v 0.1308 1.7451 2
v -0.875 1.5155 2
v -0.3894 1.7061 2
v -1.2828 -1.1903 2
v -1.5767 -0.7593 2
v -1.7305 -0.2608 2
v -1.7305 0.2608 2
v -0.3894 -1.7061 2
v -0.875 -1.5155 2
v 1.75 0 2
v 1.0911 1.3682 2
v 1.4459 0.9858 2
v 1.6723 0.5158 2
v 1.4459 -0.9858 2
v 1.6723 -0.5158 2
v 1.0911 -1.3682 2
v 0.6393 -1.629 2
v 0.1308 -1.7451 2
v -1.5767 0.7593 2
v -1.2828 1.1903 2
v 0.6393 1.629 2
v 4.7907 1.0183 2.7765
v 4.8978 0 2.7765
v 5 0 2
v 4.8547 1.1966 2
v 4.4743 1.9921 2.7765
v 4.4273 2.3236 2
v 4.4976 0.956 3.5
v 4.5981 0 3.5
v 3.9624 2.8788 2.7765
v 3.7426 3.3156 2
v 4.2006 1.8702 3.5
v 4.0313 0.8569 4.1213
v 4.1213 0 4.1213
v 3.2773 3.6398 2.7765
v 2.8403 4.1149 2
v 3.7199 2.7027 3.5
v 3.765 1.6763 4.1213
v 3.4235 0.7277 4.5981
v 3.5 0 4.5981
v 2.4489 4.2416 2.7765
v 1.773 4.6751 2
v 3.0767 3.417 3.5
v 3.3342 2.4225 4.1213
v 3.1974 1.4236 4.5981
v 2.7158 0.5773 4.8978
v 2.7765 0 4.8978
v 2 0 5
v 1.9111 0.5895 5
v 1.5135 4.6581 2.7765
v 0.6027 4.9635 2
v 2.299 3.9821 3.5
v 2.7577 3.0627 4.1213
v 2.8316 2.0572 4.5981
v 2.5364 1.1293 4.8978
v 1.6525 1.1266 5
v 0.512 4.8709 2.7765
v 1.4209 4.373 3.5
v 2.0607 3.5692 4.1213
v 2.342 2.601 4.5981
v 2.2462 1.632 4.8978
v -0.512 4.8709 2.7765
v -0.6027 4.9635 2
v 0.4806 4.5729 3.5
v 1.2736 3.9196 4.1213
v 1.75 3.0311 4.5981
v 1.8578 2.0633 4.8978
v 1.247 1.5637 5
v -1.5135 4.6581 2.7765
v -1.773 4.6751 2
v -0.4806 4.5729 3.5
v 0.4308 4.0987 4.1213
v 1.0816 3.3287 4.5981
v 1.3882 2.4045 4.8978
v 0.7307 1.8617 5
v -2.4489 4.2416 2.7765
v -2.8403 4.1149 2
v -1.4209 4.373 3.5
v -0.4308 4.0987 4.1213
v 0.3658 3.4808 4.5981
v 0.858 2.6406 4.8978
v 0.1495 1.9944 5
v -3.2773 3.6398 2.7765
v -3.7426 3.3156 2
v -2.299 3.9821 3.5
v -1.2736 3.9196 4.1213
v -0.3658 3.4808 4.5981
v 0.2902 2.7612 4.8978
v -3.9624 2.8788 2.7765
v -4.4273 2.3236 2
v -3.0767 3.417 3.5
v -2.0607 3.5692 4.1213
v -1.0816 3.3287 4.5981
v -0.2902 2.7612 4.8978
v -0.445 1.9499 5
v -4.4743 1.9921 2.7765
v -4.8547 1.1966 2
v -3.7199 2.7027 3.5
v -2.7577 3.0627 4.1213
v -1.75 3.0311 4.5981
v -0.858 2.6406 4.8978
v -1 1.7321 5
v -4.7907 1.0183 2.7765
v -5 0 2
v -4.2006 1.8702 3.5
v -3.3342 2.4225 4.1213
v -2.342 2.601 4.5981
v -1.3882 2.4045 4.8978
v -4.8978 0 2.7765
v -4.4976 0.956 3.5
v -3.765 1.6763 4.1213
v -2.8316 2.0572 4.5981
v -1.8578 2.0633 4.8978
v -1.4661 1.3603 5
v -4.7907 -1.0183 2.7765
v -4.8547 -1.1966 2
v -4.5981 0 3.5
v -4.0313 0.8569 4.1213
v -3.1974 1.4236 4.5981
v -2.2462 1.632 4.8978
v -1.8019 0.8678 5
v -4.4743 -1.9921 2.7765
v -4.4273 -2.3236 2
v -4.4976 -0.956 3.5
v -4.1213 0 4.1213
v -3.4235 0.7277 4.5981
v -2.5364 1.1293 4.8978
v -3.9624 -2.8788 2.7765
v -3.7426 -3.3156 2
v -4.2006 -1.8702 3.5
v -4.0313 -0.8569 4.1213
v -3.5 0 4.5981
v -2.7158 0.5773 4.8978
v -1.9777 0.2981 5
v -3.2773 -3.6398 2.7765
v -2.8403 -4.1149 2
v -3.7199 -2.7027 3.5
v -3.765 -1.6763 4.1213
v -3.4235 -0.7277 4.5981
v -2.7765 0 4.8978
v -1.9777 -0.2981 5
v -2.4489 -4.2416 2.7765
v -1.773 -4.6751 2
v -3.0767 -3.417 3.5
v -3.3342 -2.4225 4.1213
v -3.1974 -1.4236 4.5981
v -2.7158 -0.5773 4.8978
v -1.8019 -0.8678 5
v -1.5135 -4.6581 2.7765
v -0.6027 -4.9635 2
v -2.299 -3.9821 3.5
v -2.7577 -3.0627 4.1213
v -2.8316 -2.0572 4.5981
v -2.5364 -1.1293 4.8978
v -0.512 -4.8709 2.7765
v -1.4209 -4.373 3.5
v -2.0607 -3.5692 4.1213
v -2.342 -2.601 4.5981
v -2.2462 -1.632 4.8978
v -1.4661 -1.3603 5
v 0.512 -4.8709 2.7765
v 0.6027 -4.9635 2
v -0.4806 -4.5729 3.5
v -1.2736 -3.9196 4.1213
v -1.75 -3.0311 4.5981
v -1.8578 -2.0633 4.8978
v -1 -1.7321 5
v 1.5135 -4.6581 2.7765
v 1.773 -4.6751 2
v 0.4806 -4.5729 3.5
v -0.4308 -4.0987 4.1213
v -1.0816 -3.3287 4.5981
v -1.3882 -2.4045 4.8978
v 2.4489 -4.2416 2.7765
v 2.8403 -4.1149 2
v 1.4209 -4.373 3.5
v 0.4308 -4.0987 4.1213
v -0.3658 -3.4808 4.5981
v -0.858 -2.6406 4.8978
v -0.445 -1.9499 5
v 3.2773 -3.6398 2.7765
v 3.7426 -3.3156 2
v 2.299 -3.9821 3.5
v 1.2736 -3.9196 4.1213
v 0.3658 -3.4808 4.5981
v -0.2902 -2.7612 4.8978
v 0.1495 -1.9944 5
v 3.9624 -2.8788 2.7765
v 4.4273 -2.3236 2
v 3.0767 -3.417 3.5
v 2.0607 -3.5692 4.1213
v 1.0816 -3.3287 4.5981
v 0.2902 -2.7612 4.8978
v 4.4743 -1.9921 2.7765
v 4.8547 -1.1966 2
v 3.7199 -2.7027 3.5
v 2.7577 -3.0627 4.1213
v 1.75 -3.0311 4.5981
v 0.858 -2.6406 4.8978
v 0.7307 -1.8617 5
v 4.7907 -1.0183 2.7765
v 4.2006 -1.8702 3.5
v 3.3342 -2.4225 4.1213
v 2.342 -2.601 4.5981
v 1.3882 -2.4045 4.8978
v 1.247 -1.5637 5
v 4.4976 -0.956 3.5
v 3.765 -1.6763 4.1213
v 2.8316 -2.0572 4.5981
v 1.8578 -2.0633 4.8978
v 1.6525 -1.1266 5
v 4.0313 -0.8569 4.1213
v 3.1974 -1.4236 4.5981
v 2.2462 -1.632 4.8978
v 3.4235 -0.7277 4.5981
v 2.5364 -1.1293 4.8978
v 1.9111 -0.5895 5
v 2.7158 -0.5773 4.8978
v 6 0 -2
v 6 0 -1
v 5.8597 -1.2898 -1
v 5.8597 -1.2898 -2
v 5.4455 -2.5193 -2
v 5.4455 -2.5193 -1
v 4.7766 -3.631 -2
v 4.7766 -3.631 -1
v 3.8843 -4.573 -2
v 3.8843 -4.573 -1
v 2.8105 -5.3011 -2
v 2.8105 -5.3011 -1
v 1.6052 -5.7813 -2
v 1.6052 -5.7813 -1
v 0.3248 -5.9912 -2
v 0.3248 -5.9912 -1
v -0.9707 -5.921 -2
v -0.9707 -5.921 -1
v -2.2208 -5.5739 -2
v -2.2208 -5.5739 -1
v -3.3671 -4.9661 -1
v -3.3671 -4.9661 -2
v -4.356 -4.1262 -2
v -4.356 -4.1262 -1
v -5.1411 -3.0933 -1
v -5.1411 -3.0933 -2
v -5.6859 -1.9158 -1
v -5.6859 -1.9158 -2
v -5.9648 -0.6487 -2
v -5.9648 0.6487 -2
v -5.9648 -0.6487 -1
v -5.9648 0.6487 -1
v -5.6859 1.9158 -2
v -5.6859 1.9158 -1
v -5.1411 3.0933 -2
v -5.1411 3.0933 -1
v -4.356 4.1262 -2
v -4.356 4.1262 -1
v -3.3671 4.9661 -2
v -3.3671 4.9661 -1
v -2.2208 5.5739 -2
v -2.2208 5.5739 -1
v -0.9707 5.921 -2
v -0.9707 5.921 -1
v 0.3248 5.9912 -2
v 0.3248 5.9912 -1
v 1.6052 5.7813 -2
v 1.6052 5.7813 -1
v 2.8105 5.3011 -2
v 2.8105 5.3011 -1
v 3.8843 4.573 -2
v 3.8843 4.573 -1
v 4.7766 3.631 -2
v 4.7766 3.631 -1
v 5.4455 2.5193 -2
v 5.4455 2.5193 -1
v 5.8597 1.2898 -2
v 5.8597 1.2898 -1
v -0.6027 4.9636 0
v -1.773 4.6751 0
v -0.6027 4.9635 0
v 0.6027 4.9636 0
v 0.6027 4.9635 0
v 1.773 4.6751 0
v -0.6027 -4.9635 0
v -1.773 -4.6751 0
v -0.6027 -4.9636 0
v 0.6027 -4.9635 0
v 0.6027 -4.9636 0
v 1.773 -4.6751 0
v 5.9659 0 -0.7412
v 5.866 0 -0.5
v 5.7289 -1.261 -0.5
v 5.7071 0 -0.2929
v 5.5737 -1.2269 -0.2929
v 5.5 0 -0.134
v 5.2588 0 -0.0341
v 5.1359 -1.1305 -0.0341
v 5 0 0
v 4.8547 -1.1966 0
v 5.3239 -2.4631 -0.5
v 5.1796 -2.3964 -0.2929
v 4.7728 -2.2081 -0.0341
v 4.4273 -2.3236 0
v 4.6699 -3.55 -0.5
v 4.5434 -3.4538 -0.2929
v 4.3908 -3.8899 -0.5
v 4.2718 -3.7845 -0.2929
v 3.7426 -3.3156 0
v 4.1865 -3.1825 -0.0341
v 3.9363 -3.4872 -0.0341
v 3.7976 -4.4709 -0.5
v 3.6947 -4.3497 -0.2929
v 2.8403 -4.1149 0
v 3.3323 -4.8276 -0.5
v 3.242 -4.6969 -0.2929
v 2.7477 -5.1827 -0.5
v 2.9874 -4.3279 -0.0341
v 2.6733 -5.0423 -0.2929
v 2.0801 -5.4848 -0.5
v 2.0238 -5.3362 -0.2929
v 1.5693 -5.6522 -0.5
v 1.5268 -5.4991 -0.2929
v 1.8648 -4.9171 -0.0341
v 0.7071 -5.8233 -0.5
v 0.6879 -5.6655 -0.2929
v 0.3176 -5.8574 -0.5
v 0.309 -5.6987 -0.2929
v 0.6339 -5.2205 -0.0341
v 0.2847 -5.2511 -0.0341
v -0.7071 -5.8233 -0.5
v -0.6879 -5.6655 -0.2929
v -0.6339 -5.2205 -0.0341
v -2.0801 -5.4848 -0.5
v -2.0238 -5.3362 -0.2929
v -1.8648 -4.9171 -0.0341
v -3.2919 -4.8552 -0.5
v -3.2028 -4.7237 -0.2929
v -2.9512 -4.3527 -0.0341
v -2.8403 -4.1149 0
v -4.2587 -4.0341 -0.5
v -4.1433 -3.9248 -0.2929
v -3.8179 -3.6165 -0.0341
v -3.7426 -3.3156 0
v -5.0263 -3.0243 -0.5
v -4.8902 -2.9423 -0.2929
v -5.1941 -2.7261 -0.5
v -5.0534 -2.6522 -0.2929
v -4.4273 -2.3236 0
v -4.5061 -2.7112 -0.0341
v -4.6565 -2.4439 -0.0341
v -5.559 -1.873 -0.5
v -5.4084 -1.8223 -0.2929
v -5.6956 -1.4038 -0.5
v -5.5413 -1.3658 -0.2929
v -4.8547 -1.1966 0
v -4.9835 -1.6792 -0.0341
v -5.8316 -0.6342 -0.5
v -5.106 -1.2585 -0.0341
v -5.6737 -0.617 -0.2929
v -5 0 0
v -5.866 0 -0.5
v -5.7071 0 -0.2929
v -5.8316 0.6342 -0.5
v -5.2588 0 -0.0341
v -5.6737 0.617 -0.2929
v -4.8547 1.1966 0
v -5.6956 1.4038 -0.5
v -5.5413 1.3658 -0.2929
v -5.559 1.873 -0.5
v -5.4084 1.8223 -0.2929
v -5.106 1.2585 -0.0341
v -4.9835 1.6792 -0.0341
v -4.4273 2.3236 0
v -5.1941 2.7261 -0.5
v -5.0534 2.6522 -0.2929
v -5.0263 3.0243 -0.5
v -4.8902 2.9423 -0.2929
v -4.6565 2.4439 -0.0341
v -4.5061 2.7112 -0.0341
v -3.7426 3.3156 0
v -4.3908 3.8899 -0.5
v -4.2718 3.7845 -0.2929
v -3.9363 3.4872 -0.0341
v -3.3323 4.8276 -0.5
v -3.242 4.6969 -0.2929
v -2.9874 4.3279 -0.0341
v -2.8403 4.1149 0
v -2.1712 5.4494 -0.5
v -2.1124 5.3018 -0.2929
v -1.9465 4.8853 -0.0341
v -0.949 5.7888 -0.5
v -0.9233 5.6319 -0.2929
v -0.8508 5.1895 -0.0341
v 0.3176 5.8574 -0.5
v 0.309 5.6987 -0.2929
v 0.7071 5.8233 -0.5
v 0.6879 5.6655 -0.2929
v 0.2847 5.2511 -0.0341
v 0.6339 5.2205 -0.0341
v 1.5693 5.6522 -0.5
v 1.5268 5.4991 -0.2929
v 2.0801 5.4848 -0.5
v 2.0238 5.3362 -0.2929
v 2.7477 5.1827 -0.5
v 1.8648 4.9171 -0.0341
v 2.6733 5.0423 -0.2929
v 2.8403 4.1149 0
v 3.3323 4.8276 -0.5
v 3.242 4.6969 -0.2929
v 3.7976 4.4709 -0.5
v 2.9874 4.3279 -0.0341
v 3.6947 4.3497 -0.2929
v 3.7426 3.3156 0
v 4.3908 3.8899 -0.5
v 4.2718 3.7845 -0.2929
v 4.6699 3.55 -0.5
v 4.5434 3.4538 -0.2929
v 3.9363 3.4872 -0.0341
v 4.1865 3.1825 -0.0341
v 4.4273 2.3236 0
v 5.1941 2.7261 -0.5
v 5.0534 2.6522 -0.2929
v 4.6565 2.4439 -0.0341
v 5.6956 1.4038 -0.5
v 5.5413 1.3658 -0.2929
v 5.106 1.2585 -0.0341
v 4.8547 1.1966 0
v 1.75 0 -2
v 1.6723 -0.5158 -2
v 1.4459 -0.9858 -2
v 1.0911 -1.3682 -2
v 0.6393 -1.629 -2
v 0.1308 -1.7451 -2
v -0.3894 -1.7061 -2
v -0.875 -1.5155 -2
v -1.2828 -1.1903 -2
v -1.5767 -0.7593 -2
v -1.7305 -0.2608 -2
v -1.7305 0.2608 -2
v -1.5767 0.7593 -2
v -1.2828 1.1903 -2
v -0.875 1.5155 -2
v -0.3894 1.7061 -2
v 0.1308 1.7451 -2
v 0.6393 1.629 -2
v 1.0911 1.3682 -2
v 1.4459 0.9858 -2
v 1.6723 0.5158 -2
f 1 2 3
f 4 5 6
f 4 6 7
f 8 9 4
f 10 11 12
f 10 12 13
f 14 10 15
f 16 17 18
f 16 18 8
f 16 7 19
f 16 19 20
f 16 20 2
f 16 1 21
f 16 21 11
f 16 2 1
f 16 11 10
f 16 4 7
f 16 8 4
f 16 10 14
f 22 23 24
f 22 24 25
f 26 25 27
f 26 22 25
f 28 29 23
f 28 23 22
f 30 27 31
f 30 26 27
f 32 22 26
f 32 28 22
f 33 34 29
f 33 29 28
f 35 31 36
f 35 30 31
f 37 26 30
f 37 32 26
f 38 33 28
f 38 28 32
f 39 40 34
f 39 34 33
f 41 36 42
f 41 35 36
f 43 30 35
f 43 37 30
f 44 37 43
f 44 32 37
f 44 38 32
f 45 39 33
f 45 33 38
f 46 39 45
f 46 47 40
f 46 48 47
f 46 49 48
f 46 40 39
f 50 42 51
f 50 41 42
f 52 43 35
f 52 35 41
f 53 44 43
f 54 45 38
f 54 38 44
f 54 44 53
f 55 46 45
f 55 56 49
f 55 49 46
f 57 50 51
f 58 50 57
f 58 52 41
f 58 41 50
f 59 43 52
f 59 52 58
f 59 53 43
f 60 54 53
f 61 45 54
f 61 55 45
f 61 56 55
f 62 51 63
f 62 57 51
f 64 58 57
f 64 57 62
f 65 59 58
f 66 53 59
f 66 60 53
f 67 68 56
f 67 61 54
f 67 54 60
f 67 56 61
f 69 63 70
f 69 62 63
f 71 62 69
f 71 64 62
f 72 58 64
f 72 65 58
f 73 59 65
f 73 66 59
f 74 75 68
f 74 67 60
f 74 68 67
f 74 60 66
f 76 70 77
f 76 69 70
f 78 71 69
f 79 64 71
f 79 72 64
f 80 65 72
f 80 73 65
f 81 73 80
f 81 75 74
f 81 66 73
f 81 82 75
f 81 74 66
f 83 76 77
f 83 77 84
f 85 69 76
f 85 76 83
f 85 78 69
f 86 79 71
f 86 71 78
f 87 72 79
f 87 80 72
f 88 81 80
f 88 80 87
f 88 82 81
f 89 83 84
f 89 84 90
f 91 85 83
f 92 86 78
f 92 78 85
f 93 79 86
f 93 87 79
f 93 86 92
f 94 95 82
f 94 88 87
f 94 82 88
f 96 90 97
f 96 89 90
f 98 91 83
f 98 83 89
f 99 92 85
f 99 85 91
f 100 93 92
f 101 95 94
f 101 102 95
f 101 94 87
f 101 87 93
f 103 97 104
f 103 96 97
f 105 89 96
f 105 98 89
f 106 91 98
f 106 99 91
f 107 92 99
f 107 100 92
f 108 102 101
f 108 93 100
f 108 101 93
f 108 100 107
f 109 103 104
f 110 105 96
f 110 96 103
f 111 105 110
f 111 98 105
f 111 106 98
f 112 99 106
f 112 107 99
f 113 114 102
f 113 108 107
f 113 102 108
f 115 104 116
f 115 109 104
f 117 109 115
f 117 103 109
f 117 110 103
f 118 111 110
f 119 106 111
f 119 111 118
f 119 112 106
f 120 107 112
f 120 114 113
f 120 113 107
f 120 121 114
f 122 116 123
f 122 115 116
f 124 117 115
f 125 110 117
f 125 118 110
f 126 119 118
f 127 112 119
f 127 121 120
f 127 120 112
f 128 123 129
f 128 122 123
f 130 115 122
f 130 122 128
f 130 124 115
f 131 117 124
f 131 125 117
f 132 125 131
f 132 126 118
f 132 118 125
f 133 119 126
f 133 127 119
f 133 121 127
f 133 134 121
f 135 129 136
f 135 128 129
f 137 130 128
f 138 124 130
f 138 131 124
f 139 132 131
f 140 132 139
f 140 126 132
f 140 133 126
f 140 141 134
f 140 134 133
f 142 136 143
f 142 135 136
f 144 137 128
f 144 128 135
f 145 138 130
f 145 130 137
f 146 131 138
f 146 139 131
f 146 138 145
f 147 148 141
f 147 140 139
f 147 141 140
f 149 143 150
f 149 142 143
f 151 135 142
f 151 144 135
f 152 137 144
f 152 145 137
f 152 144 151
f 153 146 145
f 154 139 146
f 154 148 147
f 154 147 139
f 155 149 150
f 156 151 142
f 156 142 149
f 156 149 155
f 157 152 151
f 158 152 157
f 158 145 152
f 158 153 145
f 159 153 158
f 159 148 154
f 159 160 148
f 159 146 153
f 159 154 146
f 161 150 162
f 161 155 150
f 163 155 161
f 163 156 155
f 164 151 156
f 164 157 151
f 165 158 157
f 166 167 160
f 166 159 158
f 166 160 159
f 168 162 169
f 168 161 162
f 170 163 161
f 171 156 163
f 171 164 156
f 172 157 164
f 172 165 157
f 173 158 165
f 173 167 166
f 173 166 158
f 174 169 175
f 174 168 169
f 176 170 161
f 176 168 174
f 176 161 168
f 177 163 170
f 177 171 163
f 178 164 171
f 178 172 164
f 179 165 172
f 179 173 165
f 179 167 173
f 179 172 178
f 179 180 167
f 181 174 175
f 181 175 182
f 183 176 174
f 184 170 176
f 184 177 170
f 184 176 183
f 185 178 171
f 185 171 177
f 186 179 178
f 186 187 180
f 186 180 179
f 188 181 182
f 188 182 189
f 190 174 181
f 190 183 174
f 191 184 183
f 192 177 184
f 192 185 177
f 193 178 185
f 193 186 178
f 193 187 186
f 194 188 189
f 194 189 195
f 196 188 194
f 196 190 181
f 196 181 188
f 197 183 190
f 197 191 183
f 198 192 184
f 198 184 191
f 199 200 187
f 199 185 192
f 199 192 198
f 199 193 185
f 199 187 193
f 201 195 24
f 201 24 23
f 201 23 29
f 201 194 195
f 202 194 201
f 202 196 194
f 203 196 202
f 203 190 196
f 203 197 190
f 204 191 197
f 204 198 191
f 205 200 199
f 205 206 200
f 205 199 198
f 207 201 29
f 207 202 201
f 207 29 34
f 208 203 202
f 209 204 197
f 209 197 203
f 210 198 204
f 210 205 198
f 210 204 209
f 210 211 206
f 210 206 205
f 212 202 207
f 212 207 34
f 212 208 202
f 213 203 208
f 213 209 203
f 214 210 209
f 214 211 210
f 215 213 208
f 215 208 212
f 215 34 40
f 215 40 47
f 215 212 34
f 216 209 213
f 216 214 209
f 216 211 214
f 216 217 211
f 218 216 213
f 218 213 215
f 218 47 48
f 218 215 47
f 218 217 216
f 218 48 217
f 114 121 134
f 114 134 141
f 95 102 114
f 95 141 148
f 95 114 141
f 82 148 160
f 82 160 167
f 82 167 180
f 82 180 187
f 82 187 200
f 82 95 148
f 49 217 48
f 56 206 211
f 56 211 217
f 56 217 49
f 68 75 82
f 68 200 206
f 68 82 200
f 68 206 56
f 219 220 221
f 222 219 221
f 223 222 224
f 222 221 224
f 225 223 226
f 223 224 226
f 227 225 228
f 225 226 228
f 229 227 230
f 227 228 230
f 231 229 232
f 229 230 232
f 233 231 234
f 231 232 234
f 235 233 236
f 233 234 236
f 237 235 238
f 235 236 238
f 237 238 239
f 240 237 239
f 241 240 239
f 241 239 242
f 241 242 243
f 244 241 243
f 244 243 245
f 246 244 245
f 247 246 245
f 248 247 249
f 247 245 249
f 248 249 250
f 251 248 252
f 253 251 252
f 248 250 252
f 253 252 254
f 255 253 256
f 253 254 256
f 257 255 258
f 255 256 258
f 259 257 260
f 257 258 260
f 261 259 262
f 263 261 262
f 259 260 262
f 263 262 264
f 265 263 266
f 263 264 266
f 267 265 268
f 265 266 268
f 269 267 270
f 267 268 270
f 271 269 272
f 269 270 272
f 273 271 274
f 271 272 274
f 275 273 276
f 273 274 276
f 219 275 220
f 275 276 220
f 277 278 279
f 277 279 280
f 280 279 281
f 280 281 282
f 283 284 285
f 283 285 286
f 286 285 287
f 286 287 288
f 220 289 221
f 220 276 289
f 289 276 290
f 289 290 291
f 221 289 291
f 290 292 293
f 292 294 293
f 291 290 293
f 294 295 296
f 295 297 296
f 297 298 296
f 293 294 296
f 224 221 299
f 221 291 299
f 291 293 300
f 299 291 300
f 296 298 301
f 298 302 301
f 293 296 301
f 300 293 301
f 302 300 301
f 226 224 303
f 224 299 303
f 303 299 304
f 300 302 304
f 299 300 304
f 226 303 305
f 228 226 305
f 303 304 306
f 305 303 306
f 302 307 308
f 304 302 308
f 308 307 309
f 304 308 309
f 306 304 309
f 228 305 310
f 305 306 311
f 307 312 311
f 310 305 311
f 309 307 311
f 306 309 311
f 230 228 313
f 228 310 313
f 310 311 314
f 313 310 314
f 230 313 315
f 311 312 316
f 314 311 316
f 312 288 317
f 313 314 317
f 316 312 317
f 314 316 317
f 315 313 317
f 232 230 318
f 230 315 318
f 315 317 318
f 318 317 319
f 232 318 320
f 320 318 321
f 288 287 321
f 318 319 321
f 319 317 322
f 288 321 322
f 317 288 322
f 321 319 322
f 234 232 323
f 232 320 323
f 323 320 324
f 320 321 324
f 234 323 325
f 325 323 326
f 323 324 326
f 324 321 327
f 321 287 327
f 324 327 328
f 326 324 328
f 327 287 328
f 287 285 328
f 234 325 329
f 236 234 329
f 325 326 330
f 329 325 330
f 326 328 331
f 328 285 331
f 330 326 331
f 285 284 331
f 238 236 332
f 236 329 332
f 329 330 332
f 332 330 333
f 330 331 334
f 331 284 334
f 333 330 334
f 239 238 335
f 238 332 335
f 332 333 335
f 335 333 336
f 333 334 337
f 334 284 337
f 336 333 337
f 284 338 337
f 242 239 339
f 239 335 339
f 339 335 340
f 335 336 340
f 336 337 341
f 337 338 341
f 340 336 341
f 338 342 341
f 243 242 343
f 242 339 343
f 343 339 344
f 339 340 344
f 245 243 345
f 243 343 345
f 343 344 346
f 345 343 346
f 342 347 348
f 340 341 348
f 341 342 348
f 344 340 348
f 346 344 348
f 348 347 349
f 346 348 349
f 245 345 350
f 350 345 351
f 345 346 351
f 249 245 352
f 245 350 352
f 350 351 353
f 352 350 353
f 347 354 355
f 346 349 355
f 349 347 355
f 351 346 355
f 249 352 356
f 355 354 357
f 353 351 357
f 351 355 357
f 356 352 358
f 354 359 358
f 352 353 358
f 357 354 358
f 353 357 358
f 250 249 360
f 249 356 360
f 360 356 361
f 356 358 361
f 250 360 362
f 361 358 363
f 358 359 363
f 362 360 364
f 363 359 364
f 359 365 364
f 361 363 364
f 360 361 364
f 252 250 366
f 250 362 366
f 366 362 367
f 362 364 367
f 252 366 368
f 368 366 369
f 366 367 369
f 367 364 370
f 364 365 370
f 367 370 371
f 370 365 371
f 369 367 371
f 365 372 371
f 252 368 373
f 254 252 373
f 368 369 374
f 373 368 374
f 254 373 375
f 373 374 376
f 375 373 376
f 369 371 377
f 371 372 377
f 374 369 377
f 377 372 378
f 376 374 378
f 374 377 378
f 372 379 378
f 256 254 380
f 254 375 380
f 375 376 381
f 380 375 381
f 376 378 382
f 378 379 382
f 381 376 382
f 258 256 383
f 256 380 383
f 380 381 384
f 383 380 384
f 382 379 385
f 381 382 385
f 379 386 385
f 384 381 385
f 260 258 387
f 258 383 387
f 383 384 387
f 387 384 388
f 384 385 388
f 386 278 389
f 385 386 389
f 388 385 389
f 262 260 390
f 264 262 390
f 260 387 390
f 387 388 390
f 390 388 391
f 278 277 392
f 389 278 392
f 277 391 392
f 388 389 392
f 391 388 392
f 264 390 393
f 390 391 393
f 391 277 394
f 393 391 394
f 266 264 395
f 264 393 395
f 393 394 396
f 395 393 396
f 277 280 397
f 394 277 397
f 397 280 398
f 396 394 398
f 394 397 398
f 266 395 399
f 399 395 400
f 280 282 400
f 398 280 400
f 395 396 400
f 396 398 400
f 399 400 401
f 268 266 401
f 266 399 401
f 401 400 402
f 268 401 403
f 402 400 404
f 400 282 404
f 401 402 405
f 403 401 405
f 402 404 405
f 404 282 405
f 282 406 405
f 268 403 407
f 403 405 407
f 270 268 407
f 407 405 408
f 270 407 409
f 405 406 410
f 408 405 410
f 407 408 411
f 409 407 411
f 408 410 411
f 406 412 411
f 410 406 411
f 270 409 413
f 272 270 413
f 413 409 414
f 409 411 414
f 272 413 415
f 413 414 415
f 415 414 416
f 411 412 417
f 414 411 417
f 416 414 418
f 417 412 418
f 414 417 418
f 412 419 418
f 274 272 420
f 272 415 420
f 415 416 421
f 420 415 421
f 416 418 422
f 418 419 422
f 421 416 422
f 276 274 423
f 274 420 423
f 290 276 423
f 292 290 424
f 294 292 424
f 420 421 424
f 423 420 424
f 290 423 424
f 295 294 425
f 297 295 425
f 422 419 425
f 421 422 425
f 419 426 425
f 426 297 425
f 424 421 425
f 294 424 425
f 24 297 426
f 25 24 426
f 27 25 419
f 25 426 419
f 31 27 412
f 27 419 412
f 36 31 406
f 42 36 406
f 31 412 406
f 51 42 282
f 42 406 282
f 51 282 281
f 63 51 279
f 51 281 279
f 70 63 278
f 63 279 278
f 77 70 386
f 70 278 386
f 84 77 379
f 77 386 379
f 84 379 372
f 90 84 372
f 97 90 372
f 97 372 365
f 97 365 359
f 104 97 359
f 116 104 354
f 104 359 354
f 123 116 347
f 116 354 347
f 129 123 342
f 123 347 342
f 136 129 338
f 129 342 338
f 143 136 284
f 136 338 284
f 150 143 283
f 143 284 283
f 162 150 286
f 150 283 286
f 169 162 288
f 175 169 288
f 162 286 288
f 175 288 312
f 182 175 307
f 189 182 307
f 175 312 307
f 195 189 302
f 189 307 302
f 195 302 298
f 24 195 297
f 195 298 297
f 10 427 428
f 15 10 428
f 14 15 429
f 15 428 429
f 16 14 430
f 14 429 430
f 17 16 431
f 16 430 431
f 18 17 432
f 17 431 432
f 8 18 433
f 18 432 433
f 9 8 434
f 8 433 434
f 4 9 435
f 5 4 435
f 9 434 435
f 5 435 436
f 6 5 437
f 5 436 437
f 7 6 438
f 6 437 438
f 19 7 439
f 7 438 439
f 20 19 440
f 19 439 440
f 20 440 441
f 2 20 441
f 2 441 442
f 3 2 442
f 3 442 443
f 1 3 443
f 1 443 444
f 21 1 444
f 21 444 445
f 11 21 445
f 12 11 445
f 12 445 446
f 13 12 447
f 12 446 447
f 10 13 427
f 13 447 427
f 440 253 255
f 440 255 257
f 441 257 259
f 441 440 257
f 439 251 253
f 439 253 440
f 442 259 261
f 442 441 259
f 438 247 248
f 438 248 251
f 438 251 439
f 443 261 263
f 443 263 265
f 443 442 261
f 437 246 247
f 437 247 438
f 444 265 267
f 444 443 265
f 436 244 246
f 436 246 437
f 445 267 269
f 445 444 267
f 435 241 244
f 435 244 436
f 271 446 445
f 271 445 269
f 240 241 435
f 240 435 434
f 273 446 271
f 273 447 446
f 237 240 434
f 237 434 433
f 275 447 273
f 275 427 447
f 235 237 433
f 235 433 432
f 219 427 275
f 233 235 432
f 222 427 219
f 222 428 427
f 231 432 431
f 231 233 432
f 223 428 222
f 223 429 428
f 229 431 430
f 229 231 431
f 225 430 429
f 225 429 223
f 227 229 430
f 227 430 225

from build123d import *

# Parameters (mm, degrees)
F0_R     = 5
F1_DEPTH = 5
F2_R     = 3
F3_R     = 6
F3_R_2   = 5
F4_DEPTH = 2
F5_R     = 0.99999
F6_R     = 1.75
F7_DEPTH = 4


# Not quite as in the source:
# - a fillet or chamfer is up to 0.001 mm smaller than in the source, because OpenCascade refuses the exact size


with BuildPart() as f1:
    # F0 (on Top) → F1 (new body)
    with BuildSketch(Plane.XY):
        Circle(F0_R)
    extrude(amount=F1_DEPTH)

    # F2
    f2_edges = [f1.edges().sort_by_distance(p)[0] for p in [
        (-5, 0, 5),
    ]]
    fillet(f2_edges, radius=F2_R)

    # F3 (on face) → F4 (join)
    with BuildSketch(Plane(origin=(0, 0, 0), x_dir=(1, 0, 0), z_dir=(0, 0, -1))):
        Circle(F3_R)
        Circle(F3_R_2, mode=Mode.SUBTRACT)
        Circle(F3_R_2)
    extrude(amount=F4_DEPTH)

    # F5 (radius 1 in the source; OpenCascade refuses exactly that, so slightly less here)
    f5_edges = [f1.edges().sort_by_distance(p)[0] for p in [
        (-6, 0, 0),
    ]]
    fillet(f5_edges, radius=F5_R)

    # F6 (on face) → F7 (cut)
    with BuildSketch(Plane(origin=(0, 0, -2), x_dir=(1, 0, 0), z_dir=(0, 0, -1))):
        Circle(F6_R)
    extrude(amount=-F7_DEPTH, mode=Mode.SUBTRACT)


solid = f1.part
